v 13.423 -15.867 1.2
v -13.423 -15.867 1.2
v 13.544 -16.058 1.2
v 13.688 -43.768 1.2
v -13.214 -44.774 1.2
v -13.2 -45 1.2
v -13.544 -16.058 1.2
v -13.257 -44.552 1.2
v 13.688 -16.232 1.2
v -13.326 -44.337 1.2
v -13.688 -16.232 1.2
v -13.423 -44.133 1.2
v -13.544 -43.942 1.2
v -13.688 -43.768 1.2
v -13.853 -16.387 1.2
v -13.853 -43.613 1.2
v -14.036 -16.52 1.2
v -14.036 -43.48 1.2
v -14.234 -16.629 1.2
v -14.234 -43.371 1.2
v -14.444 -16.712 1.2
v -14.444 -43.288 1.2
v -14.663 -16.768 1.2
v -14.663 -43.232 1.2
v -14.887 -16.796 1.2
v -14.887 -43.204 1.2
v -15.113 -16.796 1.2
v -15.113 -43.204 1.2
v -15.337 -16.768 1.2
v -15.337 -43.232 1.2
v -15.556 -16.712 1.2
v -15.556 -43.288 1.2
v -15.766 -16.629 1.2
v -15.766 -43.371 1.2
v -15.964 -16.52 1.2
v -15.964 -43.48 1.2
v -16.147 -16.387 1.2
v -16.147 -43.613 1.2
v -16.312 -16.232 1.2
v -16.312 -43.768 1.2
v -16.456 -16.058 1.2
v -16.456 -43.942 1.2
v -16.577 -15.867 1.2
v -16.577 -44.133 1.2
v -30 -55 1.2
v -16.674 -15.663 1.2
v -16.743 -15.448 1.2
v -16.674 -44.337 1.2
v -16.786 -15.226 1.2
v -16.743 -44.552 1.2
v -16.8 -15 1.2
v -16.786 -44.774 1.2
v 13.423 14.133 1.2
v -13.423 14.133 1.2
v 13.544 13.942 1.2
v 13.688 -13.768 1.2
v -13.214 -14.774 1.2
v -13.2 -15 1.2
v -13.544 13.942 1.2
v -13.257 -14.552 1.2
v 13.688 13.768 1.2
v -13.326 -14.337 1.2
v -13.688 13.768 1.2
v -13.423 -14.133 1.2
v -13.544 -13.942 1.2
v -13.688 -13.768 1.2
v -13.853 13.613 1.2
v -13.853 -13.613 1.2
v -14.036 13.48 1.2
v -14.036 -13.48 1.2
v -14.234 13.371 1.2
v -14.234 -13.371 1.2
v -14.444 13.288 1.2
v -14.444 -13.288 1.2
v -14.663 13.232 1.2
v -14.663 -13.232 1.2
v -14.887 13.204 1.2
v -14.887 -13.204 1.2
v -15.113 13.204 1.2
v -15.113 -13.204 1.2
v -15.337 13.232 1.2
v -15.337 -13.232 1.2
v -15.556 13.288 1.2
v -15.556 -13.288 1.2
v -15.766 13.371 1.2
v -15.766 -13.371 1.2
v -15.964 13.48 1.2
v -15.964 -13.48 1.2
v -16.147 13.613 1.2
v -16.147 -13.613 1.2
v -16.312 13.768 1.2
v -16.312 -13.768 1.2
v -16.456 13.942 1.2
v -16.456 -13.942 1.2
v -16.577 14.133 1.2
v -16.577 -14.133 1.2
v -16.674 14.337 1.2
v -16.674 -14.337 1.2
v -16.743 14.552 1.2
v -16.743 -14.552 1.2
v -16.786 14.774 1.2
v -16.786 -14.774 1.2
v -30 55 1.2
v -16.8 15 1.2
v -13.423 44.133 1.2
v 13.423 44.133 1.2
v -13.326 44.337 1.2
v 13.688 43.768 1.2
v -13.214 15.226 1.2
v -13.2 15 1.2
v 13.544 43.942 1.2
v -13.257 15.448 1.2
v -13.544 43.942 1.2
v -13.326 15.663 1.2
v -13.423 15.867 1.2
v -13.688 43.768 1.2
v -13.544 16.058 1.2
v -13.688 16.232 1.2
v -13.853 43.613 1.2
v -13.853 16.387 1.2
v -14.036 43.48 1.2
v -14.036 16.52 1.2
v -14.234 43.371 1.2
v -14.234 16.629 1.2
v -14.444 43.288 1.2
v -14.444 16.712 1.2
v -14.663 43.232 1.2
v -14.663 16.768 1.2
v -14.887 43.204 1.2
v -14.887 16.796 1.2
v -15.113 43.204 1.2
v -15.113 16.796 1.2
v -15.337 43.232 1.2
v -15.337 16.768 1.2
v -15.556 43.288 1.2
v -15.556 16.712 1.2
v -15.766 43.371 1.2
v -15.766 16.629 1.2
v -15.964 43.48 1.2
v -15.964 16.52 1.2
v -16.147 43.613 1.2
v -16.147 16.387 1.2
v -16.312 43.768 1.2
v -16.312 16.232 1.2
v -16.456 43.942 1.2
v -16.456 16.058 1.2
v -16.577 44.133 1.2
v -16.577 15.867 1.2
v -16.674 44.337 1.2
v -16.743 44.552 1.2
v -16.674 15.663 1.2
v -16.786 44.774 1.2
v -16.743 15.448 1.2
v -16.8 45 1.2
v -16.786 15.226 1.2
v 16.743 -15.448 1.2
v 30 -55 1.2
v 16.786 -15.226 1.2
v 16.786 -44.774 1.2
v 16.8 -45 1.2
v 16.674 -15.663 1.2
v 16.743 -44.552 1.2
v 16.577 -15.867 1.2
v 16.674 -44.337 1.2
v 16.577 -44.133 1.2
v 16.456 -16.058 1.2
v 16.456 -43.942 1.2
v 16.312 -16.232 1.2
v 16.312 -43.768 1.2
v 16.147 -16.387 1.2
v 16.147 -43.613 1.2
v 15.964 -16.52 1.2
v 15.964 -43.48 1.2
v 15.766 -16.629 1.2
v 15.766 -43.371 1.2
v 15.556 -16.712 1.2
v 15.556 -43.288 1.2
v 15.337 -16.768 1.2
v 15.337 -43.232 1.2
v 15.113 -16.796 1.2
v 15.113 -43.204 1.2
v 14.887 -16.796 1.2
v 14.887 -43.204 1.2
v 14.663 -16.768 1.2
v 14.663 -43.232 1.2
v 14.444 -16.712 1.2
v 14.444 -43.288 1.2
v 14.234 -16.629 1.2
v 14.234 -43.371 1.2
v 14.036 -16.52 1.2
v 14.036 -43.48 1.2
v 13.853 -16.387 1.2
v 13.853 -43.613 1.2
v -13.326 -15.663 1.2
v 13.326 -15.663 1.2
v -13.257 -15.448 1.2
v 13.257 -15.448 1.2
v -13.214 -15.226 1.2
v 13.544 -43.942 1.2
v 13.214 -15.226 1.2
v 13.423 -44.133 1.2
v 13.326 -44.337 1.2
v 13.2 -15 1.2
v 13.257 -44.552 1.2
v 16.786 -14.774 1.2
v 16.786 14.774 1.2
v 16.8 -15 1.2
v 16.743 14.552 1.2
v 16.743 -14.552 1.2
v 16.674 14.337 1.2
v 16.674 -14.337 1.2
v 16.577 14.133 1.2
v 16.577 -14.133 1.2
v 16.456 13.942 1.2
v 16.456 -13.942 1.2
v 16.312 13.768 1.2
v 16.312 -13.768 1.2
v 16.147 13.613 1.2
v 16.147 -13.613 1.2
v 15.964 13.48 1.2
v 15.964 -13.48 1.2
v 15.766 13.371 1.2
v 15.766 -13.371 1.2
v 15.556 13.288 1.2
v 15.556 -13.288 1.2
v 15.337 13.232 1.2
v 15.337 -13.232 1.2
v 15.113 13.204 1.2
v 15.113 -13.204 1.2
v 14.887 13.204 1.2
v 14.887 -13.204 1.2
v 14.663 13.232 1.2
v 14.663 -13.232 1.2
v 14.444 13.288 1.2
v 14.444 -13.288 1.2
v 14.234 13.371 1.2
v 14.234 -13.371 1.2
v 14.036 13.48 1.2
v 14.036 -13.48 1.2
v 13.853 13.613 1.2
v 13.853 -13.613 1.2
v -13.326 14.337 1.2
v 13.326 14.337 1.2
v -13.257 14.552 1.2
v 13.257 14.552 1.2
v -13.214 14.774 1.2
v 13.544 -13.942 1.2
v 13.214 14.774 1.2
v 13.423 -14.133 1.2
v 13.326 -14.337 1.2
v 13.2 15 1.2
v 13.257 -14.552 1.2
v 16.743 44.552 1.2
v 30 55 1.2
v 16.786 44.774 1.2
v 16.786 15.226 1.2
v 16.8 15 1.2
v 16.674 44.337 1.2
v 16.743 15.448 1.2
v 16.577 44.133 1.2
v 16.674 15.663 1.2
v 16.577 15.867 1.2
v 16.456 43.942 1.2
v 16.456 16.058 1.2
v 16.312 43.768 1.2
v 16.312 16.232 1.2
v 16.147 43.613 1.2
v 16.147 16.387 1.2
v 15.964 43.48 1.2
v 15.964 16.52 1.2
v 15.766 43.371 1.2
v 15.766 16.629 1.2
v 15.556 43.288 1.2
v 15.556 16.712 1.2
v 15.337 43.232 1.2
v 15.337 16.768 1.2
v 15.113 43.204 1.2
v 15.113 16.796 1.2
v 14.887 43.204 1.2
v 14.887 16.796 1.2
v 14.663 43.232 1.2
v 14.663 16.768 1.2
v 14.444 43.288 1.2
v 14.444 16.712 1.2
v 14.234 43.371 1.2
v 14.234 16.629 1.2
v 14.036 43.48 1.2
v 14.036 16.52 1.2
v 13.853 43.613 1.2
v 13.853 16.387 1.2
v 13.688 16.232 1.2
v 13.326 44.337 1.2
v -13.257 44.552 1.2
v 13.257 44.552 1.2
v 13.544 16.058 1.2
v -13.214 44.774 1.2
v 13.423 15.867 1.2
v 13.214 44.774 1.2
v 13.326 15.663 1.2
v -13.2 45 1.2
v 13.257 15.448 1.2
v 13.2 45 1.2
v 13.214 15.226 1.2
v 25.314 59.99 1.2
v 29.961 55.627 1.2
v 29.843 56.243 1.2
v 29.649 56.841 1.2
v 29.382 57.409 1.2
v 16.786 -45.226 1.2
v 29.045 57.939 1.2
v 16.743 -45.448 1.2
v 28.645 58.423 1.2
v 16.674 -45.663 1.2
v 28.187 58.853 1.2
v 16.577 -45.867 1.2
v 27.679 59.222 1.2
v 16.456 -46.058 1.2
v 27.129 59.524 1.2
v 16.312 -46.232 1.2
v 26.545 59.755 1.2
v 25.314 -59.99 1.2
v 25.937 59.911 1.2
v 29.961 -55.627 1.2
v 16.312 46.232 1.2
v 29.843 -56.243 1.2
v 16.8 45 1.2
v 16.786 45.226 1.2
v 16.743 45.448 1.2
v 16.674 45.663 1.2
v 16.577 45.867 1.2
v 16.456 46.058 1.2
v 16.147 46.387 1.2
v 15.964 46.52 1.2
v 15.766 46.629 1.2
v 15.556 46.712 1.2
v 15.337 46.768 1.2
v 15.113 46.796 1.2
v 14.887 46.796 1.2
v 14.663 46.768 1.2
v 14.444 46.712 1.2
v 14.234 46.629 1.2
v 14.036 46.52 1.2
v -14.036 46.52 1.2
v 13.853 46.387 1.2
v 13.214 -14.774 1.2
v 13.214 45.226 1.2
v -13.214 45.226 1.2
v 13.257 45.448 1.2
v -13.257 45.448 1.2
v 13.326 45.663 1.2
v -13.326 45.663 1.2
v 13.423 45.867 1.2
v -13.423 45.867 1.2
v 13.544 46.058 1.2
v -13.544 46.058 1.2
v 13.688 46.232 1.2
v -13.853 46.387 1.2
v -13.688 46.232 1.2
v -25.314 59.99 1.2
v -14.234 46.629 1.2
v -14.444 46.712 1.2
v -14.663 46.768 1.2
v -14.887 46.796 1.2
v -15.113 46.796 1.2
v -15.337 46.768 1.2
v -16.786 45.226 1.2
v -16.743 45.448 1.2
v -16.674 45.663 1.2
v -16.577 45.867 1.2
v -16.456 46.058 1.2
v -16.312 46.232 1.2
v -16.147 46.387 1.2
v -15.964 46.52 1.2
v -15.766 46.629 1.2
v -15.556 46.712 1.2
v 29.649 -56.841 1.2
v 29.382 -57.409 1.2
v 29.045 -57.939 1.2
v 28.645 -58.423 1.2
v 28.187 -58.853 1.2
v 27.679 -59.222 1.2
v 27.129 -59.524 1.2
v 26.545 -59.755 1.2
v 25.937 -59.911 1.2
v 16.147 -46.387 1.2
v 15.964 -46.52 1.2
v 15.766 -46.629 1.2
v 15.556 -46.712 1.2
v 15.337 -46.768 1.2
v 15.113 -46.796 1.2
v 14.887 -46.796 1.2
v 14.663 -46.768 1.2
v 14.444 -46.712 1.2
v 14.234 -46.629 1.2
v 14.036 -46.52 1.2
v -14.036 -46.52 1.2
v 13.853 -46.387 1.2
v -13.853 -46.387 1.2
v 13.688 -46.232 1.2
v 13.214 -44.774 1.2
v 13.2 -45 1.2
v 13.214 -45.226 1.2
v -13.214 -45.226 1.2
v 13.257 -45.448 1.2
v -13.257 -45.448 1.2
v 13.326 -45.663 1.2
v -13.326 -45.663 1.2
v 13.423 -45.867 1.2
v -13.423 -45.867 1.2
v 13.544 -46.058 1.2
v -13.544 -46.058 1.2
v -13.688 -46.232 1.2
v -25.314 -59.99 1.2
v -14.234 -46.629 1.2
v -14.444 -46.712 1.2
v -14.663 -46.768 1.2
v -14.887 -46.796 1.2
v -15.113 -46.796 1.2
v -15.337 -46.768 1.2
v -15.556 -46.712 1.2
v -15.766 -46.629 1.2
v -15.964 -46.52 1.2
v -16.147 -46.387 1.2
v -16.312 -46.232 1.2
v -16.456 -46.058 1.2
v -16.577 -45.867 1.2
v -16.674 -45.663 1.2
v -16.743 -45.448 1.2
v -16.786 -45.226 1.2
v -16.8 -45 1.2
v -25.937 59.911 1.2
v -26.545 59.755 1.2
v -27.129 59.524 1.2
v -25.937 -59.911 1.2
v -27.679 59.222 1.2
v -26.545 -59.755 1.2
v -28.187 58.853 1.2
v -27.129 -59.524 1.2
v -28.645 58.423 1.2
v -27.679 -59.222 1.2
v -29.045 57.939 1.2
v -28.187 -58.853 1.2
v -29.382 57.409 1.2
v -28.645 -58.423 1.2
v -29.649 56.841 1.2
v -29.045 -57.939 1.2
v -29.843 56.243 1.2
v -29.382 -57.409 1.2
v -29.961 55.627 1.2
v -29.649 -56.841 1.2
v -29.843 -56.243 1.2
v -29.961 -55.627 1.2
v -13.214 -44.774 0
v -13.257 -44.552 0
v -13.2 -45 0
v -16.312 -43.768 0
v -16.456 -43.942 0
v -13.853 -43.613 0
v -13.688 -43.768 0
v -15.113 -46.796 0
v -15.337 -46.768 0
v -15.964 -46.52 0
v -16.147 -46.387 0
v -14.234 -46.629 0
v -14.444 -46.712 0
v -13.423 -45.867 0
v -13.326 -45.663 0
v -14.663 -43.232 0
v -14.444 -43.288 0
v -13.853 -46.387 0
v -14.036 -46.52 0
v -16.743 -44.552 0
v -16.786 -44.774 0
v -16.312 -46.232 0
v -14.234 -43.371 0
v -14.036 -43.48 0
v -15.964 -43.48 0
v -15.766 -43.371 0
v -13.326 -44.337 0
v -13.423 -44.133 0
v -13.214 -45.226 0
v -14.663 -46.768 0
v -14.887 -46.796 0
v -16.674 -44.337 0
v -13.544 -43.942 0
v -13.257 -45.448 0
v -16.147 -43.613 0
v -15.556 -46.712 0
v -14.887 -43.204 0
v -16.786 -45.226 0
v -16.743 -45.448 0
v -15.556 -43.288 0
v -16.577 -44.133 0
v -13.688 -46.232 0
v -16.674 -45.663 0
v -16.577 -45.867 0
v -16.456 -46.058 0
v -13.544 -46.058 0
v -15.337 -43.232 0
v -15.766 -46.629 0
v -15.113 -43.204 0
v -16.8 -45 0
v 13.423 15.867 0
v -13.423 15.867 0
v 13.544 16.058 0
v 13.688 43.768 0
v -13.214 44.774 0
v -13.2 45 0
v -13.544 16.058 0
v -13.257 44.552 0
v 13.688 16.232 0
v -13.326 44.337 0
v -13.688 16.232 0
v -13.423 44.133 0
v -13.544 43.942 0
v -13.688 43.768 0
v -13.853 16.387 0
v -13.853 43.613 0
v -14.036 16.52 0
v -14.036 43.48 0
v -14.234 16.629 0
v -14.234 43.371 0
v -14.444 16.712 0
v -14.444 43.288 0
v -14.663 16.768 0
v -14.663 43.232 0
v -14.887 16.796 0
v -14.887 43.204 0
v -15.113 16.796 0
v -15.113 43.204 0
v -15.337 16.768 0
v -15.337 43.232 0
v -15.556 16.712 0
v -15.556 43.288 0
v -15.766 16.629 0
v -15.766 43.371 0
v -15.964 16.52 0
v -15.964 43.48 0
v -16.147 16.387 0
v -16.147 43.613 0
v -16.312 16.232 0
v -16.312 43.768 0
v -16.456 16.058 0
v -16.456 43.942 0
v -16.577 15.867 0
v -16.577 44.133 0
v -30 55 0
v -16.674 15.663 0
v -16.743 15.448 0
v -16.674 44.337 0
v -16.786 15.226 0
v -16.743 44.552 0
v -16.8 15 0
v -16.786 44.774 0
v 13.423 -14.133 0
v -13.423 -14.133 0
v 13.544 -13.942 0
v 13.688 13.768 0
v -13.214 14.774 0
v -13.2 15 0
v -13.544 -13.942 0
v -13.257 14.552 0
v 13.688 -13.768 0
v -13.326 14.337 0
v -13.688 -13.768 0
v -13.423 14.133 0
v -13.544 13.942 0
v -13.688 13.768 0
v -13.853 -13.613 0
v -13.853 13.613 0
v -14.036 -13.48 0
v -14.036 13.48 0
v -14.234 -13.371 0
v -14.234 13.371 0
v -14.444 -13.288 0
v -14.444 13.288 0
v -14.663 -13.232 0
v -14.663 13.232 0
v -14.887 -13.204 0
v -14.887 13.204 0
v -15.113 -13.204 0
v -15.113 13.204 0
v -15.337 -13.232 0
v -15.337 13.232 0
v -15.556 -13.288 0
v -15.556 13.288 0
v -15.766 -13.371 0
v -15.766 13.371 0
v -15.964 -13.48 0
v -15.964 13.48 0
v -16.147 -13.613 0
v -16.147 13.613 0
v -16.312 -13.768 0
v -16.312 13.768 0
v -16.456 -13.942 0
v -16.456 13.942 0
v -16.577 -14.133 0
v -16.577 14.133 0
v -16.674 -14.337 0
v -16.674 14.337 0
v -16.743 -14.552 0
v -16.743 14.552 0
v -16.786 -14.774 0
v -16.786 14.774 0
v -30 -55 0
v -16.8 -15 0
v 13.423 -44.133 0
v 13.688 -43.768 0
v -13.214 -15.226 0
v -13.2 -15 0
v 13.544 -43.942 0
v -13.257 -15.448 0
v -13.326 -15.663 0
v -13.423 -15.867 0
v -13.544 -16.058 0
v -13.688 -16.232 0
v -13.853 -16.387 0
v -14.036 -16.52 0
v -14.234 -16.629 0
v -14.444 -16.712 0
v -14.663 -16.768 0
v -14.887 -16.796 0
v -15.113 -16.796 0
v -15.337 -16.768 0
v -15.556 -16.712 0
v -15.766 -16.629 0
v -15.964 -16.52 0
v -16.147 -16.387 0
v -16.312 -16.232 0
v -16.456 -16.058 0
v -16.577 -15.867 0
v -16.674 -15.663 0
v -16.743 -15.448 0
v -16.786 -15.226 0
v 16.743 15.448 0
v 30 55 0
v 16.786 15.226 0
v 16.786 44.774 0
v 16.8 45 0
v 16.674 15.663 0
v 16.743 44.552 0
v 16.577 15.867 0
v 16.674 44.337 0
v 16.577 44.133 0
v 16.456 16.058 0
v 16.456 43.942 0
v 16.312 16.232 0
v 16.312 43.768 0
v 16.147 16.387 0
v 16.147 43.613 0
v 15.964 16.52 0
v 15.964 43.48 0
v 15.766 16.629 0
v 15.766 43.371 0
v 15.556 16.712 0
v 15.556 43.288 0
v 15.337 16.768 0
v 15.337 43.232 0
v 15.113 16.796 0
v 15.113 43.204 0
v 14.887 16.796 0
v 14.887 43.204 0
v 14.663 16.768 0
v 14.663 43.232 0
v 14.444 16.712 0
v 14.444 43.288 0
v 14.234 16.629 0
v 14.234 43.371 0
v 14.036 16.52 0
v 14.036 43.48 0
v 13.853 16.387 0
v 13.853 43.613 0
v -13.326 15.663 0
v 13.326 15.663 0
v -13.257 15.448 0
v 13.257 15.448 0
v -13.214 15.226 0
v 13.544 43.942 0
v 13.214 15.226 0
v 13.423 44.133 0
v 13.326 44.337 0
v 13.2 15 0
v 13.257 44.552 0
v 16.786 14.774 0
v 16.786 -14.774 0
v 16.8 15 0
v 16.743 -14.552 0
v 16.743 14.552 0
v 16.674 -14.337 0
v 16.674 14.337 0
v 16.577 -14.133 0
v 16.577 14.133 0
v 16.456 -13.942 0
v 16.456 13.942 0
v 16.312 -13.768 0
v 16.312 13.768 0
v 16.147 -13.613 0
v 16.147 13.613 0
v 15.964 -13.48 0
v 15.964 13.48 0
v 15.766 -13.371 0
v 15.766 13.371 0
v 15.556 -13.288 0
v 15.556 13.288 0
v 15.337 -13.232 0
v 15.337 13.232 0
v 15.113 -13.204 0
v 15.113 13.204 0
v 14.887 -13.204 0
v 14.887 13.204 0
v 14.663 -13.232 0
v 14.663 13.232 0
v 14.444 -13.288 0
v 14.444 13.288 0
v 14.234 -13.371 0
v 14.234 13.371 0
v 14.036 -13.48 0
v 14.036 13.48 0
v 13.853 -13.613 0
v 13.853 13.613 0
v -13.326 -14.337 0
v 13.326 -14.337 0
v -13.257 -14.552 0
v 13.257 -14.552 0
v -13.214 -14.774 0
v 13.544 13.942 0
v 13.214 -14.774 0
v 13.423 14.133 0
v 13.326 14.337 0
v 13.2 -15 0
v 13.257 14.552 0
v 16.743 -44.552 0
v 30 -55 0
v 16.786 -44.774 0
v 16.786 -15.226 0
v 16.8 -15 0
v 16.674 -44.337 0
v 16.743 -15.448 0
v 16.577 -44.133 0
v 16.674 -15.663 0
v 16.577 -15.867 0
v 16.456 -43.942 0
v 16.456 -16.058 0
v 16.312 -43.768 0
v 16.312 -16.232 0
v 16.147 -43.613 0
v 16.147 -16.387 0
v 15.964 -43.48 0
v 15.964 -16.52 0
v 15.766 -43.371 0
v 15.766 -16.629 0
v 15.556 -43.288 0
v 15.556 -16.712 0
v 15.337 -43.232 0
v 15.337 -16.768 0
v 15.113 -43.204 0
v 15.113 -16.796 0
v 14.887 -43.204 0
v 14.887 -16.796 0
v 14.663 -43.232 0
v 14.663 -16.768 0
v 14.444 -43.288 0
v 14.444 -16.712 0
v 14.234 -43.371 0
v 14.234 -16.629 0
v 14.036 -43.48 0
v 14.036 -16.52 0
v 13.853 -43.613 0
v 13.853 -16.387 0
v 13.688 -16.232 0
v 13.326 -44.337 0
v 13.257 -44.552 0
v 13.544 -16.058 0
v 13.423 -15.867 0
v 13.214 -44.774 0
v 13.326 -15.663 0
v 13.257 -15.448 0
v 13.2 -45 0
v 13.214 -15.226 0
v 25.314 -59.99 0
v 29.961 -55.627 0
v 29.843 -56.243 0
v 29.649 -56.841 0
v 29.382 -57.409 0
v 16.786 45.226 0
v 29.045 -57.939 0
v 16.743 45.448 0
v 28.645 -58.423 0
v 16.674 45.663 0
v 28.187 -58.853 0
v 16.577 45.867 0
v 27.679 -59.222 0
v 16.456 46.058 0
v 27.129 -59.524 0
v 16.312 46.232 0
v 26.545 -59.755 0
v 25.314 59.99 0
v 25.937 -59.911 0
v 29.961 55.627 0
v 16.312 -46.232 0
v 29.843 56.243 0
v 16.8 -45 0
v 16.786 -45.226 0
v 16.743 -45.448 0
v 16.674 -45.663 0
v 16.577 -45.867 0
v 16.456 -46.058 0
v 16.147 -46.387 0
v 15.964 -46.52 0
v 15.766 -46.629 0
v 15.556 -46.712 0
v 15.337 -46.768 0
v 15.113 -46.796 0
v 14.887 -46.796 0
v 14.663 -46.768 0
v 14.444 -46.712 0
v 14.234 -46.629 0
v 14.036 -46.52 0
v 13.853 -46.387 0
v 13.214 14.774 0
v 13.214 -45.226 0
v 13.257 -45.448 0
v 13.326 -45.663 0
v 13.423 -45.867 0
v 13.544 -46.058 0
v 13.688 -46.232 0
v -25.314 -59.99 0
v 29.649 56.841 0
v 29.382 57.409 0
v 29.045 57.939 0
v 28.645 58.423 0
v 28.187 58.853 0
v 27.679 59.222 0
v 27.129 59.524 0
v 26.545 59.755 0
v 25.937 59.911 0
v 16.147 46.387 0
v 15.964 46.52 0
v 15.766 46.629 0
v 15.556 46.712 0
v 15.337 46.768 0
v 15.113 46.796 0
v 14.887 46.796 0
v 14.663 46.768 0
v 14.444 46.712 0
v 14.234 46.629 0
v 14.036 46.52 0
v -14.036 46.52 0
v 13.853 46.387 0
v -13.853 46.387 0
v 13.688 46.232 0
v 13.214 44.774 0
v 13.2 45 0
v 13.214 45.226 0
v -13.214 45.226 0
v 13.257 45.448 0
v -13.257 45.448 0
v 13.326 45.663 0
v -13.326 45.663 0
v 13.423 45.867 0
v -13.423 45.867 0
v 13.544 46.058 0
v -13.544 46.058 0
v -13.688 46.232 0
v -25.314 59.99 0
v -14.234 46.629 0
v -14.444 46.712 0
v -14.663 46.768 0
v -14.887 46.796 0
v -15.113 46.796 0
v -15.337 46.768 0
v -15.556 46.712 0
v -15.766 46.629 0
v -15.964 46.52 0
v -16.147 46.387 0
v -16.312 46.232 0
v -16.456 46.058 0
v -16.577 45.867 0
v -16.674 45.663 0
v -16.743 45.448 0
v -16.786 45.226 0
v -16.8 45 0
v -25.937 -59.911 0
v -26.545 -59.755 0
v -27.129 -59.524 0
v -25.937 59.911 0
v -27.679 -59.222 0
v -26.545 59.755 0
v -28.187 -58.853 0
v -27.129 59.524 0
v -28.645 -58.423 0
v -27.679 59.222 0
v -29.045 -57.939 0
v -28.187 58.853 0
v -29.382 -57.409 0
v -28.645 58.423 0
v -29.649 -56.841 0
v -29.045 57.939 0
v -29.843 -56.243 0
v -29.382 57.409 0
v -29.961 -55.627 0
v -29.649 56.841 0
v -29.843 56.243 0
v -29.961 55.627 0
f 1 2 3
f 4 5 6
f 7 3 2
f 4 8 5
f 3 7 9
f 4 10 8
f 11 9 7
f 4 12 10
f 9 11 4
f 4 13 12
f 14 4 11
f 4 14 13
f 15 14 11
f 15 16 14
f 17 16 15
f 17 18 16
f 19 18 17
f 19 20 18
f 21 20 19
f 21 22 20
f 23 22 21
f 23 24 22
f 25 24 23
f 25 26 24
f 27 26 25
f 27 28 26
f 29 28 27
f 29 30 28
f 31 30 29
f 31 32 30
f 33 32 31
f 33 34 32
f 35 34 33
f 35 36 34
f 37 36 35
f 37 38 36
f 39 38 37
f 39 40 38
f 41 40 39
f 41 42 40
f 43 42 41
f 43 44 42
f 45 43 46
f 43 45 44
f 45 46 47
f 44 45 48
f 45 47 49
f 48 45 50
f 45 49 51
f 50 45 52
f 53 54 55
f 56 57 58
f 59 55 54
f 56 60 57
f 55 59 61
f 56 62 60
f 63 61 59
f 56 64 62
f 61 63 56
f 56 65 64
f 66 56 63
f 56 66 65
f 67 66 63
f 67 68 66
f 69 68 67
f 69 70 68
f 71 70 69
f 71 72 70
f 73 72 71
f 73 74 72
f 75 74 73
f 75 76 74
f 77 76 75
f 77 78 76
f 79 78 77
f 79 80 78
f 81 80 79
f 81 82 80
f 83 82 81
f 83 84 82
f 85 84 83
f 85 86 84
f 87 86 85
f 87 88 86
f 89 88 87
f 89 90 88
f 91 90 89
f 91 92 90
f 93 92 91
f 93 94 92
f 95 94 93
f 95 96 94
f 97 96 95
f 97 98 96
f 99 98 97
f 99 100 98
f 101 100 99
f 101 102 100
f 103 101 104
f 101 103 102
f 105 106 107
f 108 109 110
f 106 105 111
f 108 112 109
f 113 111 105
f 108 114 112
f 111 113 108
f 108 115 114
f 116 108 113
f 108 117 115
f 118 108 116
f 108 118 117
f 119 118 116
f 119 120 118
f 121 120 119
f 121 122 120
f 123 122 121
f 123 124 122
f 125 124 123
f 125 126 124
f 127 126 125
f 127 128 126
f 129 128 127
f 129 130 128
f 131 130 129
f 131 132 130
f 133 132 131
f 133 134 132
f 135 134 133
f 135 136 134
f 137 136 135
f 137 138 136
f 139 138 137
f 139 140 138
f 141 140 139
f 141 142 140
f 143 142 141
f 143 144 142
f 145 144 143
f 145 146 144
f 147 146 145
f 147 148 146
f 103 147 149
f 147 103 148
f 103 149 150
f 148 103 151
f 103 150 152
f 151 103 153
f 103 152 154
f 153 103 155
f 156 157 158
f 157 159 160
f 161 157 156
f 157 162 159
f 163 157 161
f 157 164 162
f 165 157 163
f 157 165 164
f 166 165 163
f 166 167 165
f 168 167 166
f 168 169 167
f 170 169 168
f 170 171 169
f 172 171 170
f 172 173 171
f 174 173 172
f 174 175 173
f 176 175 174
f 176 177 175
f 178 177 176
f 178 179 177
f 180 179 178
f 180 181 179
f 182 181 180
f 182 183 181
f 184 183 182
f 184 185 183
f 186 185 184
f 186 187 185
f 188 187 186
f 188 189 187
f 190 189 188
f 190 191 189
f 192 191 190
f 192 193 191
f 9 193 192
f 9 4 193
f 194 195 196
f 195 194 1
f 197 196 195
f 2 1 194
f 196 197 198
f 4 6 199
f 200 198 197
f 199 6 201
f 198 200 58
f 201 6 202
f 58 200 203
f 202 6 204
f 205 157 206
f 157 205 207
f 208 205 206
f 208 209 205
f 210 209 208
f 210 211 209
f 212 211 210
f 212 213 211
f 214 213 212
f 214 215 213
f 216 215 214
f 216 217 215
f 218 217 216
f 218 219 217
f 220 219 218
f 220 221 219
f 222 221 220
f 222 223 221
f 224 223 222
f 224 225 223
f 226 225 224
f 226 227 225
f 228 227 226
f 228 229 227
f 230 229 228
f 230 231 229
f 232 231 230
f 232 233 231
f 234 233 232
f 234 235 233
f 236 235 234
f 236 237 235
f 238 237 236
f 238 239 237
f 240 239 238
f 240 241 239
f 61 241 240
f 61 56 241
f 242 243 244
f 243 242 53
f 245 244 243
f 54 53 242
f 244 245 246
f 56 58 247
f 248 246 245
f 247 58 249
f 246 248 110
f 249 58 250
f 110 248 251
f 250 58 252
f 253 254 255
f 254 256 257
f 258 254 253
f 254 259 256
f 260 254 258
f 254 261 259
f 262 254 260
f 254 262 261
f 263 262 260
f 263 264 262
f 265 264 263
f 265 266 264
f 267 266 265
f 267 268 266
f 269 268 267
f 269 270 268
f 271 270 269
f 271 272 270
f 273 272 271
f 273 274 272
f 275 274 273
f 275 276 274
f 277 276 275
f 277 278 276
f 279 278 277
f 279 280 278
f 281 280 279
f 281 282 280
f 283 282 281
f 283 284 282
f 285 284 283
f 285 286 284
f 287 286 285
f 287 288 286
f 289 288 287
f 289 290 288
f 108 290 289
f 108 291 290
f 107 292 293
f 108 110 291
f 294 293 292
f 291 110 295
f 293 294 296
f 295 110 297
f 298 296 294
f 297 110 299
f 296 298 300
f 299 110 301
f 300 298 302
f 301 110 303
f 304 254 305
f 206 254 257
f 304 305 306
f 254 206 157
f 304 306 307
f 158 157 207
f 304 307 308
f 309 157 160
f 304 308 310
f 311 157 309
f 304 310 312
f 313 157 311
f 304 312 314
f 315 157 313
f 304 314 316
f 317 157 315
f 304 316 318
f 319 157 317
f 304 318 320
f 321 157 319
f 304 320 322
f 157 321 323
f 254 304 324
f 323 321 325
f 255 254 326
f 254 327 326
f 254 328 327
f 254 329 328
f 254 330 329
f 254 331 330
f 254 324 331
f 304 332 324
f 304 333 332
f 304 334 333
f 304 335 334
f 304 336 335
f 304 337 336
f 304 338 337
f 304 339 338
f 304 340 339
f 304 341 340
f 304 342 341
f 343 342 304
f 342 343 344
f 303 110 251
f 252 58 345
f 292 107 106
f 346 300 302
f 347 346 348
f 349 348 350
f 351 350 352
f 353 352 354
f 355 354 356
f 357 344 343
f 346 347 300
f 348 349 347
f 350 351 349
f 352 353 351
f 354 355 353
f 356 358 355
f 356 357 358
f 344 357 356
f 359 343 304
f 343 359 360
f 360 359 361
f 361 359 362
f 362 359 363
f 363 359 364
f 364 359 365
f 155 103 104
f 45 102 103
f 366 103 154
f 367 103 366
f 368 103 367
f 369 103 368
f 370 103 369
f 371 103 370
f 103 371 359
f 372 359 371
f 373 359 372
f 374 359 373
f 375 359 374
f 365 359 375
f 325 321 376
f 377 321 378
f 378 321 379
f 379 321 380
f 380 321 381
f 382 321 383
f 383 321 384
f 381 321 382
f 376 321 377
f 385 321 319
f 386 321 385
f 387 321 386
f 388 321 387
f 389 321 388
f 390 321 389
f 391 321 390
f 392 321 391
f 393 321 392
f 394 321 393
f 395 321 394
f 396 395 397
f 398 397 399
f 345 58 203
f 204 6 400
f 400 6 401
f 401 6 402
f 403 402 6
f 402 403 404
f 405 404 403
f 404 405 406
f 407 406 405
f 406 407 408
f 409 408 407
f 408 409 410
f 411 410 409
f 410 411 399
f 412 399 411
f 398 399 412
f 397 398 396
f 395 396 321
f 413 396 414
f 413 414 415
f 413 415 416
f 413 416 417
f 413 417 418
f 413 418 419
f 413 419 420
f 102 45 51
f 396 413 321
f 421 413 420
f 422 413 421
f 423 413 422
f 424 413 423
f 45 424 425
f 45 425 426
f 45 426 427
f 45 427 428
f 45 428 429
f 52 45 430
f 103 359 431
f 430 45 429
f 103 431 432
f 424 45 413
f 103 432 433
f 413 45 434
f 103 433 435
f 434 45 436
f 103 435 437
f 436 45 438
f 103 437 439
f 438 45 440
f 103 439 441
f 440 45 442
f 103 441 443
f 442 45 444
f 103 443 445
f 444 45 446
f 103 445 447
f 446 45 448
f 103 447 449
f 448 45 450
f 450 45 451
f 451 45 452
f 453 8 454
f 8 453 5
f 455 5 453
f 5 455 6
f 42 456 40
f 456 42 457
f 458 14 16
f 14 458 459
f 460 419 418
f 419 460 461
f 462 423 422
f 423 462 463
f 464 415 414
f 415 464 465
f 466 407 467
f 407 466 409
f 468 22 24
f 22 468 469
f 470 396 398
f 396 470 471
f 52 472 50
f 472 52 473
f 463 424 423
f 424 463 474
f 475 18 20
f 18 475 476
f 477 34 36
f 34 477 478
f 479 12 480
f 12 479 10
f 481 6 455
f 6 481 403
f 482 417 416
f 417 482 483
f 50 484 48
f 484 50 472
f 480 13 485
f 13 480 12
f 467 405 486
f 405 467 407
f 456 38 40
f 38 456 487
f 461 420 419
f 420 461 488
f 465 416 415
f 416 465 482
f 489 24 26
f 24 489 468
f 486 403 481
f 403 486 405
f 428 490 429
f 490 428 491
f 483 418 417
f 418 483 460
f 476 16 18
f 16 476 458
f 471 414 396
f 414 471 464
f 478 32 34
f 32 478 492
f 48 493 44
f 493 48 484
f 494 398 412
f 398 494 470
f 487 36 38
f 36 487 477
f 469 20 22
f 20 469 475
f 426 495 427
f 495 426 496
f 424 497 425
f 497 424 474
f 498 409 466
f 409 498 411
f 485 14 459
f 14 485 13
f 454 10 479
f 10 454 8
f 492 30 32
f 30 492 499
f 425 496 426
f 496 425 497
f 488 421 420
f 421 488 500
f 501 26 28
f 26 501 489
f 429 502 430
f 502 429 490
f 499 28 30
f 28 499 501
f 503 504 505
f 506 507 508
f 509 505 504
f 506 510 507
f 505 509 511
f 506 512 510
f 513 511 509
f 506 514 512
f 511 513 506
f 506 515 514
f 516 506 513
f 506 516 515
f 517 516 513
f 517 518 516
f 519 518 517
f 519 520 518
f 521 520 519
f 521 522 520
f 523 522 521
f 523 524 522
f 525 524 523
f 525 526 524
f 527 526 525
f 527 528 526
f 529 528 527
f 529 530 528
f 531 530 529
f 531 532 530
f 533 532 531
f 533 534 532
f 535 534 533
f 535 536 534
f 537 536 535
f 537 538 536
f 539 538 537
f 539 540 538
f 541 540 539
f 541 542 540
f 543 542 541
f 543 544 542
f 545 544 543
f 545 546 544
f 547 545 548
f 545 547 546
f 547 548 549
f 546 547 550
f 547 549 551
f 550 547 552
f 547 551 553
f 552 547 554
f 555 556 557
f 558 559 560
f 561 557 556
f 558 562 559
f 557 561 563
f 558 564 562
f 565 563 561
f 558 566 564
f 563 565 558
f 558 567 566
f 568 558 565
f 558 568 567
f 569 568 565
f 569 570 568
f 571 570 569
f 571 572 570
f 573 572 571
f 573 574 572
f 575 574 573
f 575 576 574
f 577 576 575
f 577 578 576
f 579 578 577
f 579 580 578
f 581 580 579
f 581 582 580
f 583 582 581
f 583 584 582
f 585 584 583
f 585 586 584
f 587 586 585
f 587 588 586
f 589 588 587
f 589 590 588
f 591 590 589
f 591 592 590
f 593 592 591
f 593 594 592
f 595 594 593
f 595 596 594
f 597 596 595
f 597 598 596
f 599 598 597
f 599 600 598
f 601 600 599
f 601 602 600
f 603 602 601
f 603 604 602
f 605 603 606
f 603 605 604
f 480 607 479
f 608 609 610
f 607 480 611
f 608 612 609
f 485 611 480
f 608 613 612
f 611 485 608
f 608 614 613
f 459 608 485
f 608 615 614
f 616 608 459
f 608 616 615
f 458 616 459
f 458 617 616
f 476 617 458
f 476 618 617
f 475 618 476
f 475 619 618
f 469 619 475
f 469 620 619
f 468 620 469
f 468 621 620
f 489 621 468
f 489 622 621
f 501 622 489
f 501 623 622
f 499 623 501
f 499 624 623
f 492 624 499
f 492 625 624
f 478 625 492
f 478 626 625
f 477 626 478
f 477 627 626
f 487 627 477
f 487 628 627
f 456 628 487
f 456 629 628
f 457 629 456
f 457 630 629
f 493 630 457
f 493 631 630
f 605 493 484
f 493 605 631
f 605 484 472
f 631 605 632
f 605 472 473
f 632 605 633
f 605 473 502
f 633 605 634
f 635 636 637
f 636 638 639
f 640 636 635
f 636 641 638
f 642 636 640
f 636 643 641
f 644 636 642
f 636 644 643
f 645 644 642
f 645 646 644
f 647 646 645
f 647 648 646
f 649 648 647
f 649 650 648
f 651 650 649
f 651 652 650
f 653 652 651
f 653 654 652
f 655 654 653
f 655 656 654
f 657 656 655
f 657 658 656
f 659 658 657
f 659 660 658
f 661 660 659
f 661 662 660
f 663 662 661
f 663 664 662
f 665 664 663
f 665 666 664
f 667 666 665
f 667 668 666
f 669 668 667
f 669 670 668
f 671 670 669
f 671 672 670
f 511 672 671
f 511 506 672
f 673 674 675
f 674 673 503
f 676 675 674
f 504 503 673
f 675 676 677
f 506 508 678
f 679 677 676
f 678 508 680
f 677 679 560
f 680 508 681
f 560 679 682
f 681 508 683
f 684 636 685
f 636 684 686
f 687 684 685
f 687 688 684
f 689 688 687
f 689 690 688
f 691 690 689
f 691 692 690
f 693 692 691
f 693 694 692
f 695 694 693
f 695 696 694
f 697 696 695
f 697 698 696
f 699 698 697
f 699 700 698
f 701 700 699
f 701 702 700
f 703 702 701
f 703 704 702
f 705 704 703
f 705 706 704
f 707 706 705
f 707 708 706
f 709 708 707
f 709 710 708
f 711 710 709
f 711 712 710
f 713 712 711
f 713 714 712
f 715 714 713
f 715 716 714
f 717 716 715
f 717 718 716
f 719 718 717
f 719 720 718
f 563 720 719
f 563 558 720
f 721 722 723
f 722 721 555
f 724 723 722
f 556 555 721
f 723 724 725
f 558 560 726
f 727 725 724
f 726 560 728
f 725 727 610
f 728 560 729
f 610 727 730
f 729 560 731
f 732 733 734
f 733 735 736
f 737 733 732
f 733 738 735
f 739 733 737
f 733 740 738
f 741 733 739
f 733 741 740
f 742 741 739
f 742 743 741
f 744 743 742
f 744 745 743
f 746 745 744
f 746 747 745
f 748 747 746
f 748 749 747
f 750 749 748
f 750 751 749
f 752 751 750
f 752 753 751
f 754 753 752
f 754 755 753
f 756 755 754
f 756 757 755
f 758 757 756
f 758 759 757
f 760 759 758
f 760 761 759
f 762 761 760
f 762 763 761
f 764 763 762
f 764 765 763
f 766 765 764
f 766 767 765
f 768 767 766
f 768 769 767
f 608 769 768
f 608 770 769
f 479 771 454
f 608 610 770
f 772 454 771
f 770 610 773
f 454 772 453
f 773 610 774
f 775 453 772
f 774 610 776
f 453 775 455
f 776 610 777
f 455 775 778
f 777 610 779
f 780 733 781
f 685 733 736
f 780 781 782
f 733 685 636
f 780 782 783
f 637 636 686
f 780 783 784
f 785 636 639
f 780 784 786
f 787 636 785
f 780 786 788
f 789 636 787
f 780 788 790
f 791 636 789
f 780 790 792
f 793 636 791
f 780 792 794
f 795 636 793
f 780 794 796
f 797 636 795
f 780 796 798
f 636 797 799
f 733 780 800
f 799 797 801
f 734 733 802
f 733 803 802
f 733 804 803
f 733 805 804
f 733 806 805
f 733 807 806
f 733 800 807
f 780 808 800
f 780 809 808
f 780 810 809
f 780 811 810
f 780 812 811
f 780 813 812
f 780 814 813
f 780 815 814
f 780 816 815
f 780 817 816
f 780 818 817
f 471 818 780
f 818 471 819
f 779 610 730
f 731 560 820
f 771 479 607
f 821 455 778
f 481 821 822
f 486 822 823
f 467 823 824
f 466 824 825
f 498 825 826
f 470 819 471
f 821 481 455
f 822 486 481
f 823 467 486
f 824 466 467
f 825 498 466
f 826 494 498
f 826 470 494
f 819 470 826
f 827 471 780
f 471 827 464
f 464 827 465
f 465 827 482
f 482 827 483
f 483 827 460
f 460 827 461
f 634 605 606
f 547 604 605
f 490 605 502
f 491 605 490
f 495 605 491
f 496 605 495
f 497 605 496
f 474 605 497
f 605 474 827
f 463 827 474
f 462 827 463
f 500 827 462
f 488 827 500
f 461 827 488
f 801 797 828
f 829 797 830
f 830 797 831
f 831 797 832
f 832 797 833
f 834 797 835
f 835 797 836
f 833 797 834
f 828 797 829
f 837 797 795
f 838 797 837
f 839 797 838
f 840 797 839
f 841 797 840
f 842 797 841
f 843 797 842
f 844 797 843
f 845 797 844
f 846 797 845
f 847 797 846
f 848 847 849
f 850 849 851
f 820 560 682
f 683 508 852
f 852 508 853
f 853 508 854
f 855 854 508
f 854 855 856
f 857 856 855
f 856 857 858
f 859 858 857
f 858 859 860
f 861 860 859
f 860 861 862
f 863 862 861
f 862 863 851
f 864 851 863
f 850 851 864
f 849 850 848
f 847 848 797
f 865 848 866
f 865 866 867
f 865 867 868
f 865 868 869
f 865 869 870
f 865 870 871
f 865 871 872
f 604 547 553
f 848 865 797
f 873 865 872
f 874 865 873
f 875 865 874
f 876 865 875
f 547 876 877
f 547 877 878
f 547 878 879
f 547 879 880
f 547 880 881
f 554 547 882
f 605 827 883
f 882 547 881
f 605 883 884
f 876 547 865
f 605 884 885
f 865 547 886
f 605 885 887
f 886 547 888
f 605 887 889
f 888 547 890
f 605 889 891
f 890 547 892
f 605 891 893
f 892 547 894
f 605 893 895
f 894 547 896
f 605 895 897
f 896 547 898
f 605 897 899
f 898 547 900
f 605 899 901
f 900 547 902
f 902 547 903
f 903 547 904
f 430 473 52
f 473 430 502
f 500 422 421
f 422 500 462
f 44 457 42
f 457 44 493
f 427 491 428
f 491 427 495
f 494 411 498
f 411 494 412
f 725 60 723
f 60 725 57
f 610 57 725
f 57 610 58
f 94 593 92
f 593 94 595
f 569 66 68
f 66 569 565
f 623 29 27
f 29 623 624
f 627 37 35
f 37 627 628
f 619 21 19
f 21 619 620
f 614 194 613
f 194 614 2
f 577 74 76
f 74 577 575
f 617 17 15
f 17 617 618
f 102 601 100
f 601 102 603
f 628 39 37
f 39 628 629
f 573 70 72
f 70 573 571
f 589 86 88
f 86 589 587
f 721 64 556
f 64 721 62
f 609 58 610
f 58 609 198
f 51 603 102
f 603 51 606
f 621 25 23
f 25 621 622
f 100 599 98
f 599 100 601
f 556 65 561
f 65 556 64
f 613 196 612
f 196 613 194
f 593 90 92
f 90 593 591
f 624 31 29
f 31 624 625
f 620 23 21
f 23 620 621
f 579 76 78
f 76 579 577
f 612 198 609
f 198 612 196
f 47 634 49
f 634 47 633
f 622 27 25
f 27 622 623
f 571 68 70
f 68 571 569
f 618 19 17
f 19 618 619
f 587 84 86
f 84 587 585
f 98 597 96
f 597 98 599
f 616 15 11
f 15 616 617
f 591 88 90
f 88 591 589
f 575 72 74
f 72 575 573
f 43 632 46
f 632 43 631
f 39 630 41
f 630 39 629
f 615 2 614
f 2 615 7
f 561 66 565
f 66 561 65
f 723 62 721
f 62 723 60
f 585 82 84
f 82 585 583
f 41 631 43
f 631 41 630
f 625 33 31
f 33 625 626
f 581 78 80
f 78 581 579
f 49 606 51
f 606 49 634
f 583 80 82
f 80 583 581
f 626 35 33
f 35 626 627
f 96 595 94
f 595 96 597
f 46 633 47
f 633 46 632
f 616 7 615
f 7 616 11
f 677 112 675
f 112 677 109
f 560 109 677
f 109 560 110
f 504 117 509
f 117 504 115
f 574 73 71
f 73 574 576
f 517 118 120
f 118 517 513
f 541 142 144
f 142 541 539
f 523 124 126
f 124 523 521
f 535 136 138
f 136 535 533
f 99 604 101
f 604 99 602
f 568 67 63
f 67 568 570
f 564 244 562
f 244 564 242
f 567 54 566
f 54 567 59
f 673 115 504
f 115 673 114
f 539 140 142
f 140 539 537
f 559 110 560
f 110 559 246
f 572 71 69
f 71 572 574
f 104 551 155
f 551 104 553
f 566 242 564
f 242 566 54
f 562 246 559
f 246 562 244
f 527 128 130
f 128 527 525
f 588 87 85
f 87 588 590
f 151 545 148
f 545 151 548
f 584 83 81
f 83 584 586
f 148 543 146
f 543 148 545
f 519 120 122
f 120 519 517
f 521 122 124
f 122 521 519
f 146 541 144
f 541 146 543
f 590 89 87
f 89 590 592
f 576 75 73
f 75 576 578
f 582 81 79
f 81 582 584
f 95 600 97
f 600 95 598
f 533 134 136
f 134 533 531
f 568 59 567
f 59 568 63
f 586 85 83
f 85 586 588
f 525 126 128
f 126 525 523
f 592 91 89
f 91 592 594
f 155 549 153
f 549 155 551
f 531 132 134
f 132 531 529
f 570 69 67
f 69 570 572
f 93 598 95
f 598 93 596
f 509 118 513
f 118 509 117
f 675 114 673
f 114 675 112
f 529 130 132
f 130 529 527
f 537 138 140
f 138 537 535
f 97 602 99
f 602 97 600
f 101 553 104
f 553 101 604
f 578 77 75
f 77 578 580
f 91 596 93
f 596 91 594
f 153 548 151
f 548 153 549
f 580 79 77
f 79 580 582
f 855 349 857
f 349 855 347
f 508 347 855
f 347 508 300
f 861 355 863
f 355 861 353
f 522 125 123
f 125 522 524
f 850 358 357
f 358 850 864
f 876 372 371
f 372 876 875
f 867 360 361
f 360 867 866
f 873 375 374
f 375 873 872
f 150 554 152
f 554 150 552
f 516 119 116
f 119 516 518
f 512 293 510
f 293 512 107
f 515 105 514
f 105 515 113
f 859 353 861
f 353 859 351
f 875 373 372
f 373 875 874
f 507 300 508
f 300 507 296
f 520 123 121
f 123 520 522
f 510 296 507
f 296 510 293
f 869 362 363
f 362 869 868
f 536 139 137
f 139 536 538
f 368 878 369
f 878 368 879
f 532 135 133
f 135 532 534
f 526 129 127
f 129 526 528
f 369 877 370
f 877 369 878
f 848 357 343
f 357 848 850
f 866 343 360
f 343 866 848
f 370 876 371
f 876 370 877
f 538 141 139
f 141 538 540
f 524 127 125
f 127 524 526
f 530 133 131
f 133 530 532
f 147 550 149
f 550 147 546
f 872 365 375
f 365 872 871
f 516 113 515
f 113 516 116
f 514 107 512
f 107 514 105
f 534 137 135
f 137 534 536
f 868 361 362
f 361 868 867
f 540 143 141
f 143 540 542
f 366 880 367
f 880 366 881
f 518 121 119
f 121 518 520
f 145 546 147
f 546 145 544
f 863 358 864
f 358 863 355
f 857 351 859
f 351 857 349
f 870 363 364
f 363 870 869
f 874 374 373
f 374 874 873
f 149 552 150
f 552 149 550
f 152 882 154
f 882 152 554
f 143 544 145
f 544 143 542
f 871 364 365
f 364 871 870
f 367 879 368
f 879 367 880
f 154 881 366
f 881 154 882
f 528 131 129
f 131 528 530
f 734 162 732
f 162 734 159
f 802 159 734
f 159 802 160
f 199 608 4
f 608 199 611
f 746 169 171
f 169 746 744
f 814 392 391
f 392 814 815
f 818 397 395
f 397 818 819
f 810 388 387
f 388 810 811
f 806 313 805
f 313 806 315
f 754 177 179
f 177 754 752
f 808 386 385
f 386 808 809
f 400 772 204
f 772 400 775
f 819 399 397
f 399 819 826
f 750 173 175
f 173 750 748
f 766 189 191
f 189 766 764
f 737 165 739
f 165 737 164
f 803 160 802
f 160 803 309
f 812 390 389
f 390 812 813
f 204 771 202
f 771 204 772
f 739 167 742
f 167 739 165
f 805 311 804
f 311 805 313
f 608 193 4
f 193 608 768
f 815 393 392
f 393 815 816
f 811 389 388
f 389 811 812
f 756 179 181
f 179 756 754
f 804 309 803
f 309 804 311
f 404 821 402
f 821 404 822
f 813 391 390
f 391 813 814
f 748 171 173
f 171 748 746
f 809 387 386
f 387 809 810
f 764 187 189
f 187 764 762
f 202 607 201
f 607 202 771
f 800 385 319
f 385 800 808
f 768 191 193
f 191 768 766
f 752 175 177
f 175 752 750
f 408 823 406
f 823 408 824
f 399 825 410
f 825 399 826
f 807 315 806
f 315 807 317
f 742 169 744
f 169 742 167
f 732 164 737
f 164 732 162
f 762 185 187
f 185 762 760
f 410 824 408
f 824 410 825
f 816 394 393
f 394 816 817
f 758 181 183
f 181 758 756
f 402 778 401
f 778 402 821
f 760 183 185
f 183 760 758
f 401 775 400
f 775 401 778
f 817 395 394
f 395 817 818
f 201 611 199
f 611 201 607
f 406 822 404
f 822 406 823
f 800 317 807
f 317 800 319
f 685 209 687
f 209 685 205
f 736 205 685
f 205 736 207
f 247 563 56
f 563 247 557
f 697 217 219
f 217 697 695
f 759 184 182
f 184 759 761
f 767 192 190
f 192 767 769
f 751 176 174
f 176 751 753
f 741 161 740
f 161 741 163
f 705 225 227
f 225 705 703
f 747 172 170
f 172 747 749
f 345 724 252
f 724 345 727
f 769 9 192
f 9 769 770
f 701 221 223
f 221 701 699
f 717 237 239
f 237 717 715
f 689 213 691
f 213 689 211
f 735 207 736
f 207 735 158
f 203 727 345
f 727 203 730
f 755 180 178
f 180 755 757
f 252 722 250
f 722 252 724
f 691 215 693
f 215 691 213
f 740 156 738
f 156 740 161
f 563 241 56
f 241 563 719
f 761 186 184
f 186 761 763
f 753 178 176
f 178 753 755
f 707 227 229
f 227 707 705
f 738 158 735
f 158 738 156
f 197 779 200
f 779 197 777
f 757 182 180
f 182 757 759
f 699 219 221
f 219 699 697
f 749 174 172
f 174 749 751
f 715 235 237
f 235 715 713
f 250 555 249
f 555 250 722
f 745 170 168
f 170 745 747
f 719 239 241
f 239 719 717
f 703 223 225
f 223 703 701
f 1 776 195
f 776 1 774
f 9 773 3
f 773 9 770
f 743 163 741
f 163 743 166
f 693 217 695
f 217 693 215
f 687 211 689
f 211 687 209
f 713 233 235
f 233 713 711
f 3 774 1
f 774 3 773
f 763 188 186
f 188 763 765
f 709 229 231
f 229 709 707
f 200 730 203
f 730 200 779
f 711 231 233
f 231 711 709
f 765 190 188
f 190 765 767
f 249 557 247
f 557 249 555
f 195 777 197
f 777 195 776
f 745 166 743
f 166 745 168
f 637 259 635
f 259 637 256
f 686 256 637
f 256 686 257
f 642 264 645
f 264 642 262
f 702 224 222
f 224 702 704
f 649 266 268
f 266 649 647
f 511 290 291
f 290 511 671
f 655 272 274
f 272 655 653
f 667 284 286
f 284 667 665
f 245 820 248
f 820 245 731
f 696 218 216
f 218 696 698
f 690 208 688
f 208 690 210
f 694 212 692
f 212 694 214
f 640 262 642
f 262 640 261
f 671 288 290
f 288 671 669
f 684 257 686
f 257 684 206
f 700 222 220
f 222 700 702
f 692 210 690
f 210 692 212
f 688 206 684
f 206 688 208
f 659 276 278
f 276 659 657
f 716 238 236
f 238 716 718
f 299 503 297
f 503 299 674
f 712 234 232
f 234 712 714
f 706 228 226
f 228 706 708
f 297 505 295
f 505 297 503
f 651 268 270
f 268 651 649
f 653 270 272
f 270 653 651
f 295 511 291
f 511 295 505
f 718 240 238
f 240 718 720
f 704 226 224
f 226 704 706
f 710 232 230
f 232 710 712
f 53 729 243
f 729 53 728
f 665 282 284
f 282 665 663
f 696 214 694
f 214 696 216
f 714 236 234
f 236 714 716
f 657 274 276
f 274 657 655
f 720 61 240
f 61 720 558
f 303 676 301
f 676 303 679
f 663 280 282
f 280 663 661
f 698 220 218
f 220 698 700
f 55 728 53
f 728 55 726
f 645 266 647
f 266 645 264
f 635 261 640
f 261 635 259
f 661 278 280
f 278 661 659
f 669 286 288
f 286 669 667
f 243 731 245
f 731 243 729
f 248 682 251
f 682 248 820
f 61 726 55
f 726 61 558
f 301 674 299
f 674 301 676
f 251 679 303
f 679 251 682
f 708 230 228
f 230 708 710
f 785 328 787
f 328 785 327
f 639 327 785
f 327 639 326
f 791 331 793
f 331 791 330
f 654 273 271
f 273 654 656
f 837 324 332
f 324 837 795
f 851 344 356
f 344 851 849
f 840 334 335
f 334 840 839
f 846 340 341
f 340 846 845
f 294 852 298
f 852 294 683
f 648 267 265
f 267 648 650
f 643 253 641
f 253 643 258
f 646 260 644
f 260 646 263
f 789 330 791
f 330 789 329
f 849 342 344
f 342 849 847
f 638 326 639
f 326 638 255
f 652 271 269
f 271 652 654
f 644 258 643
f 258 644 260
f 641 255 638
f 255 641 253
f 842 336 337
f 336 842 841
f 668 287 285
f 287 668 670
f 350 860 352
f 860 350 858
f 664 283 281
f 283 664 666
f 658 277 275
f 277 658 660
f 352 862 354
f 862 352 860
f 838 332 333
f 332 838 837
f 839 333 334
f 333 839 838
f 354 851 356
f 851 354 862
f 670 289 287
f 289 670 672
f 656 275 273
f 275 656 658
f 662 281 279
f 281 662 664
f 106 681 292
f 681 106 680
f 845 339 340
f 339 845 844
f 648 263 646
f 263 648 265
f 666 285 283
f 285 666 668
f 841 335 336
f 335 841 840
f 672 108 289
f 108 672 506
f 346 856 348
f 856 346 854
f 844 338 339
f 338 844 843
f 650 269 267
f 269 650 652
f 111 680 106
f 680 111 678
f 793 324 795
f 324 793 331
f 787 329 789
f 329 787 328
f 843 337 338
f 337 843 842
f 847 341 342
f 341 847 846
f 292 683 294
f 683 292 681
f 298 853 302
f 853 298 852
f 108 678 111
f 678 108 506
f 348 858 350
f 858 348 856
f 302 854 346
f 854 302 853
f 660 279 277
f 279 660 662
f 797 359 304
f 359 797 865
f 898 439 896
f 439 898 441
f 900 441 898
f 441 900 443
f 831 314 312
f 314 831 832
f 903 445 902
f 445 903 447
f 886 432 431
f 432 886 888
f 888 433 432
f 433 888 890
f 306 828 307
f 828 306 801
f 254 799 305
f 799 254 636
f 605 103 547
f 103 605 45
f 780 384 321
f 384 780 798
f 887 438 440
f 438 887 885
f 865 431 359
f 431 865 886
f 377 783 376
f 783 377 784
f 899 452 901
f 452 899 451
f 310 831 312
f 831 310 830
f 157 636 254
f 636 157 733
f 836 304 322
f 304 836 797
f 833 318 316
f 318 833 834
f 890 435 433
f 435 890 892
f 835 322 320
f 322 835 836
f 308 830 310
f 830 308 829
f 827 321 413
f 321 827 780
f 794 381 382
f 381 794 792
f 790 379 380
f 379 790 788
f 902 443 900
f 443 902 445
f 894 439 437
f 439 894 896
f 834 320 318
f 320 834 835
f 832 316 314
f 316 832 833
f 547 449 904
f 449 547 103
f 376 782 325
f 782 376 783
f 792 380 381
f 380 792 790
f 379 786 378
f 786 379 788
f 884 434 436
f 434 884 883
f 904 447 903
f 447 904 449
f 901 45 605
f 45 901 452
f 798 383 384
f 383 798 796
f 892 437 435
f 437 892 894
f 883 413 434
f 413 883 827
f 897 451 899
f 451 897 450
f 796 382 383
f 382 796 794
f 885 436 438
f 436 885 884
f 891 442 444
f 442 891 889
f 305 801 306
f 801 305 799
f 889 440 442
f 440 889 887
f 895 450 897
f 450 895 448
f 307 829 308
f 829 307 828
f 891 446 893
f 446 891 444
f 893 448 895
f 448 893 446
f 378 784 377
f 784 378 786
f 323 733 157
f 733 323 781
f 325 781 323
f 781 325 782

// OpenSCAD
$fn = 50;


difference() {
	union() {
		hull() {
			translate(v = [-25.0000000000, 55.0000000000, 0]) {
				cylinder(h = 18, r = 5);
			}
			translate(v = [25.0000000000, 55.0000000000, 0]) {
				cylinder(h = 18, r = 5);
			}
			translate(v = [-25.0000000000, -55.0000000000, 0]) {
				cylinder(h = 18, r = 5);
			}
			translate(v = [25.0000000000, -55.0000000000, 0]) {
				cylinder(h = 18, r = 5);
			}
		}
	}
	union() {
		translate(v = [0, 0, 1.2000000000]) {
			hull() {
				translate(v = [-25.0000000000, 55.0000000000, 0]) {
					cylinder(h = 16.8000000000, r = 3.8000000000);
				}
				translate(v = [25.0000000000, 55.0000000000, 0]) {
					cylinder(h = 16.8000000000, r = 3.8000000000);
				}
				translate(v = [-25.0000000000, -55.0000000000, 0]) {
					cylinder(h = 16.8000000000, r = 3.8000000000);
				}
				translate(v = [25.0000000000, -55.0000000000, 0]) {
					cylinder(h = 16.8000000000, r = 3.8000000000);
				}
			}
		}
		#translate(v = [-15.0000000000, -45.0000000000, 0]) {
			cylinder(h = 1.2000000000, r = 1.8000000000);
		}
		#translate(v = [-15.0000000000, -15.0000000000, 0]) {
			cylinder(h = 1.2000000000, r = 1.8000000000);
		}
		#translate(v = [-15.0000000000, 15.0000000000, 0]) {
			cylinder(h = 1.2000000000, r = 1.8000000000);
		}
		#translate(v = [-15.0000000000, 45.0000000000, 0]) {
			cylinder(h = 1.2000000000, r = 1.8000000000);
		}
		#translate(v = [15.0000000000, -45.0000000000, 0]) {
			cylinder(h = 1.2000000000, r = 1.8000000000);
		}
		#translate(v = [15.0000000000, -15.0000000000, 0]) {
			cylinder(h = 1.2000000000, r = 1.8000000000);
		}
		#translate(v = [15.0000000000, 15.0000000000, 0]) {
			cylinder(h = 1.2000000000, r = 1.8000000000);
		}
		#translate(v = [15.0000000000, 45.0000000000, 0]) {
			cylinder(h = 1.2000000000, r = 1.8000000000);
		}
		translate(v = [-250.0000000000, -250.0000000000, 1.2000000000]) {
			cube(size = [500, 500, 500]);
		}
		translate(v = [-250.0000000000, -250.0000000000, 1.2000000000]) {
			cube(size = [500, 500, 500]);
		}
		translate(v = [-250.0000000000, -250.0000000000, 1.2000000000]) {
			cube(size = [500, 500, 500]);
		}
	}
}
